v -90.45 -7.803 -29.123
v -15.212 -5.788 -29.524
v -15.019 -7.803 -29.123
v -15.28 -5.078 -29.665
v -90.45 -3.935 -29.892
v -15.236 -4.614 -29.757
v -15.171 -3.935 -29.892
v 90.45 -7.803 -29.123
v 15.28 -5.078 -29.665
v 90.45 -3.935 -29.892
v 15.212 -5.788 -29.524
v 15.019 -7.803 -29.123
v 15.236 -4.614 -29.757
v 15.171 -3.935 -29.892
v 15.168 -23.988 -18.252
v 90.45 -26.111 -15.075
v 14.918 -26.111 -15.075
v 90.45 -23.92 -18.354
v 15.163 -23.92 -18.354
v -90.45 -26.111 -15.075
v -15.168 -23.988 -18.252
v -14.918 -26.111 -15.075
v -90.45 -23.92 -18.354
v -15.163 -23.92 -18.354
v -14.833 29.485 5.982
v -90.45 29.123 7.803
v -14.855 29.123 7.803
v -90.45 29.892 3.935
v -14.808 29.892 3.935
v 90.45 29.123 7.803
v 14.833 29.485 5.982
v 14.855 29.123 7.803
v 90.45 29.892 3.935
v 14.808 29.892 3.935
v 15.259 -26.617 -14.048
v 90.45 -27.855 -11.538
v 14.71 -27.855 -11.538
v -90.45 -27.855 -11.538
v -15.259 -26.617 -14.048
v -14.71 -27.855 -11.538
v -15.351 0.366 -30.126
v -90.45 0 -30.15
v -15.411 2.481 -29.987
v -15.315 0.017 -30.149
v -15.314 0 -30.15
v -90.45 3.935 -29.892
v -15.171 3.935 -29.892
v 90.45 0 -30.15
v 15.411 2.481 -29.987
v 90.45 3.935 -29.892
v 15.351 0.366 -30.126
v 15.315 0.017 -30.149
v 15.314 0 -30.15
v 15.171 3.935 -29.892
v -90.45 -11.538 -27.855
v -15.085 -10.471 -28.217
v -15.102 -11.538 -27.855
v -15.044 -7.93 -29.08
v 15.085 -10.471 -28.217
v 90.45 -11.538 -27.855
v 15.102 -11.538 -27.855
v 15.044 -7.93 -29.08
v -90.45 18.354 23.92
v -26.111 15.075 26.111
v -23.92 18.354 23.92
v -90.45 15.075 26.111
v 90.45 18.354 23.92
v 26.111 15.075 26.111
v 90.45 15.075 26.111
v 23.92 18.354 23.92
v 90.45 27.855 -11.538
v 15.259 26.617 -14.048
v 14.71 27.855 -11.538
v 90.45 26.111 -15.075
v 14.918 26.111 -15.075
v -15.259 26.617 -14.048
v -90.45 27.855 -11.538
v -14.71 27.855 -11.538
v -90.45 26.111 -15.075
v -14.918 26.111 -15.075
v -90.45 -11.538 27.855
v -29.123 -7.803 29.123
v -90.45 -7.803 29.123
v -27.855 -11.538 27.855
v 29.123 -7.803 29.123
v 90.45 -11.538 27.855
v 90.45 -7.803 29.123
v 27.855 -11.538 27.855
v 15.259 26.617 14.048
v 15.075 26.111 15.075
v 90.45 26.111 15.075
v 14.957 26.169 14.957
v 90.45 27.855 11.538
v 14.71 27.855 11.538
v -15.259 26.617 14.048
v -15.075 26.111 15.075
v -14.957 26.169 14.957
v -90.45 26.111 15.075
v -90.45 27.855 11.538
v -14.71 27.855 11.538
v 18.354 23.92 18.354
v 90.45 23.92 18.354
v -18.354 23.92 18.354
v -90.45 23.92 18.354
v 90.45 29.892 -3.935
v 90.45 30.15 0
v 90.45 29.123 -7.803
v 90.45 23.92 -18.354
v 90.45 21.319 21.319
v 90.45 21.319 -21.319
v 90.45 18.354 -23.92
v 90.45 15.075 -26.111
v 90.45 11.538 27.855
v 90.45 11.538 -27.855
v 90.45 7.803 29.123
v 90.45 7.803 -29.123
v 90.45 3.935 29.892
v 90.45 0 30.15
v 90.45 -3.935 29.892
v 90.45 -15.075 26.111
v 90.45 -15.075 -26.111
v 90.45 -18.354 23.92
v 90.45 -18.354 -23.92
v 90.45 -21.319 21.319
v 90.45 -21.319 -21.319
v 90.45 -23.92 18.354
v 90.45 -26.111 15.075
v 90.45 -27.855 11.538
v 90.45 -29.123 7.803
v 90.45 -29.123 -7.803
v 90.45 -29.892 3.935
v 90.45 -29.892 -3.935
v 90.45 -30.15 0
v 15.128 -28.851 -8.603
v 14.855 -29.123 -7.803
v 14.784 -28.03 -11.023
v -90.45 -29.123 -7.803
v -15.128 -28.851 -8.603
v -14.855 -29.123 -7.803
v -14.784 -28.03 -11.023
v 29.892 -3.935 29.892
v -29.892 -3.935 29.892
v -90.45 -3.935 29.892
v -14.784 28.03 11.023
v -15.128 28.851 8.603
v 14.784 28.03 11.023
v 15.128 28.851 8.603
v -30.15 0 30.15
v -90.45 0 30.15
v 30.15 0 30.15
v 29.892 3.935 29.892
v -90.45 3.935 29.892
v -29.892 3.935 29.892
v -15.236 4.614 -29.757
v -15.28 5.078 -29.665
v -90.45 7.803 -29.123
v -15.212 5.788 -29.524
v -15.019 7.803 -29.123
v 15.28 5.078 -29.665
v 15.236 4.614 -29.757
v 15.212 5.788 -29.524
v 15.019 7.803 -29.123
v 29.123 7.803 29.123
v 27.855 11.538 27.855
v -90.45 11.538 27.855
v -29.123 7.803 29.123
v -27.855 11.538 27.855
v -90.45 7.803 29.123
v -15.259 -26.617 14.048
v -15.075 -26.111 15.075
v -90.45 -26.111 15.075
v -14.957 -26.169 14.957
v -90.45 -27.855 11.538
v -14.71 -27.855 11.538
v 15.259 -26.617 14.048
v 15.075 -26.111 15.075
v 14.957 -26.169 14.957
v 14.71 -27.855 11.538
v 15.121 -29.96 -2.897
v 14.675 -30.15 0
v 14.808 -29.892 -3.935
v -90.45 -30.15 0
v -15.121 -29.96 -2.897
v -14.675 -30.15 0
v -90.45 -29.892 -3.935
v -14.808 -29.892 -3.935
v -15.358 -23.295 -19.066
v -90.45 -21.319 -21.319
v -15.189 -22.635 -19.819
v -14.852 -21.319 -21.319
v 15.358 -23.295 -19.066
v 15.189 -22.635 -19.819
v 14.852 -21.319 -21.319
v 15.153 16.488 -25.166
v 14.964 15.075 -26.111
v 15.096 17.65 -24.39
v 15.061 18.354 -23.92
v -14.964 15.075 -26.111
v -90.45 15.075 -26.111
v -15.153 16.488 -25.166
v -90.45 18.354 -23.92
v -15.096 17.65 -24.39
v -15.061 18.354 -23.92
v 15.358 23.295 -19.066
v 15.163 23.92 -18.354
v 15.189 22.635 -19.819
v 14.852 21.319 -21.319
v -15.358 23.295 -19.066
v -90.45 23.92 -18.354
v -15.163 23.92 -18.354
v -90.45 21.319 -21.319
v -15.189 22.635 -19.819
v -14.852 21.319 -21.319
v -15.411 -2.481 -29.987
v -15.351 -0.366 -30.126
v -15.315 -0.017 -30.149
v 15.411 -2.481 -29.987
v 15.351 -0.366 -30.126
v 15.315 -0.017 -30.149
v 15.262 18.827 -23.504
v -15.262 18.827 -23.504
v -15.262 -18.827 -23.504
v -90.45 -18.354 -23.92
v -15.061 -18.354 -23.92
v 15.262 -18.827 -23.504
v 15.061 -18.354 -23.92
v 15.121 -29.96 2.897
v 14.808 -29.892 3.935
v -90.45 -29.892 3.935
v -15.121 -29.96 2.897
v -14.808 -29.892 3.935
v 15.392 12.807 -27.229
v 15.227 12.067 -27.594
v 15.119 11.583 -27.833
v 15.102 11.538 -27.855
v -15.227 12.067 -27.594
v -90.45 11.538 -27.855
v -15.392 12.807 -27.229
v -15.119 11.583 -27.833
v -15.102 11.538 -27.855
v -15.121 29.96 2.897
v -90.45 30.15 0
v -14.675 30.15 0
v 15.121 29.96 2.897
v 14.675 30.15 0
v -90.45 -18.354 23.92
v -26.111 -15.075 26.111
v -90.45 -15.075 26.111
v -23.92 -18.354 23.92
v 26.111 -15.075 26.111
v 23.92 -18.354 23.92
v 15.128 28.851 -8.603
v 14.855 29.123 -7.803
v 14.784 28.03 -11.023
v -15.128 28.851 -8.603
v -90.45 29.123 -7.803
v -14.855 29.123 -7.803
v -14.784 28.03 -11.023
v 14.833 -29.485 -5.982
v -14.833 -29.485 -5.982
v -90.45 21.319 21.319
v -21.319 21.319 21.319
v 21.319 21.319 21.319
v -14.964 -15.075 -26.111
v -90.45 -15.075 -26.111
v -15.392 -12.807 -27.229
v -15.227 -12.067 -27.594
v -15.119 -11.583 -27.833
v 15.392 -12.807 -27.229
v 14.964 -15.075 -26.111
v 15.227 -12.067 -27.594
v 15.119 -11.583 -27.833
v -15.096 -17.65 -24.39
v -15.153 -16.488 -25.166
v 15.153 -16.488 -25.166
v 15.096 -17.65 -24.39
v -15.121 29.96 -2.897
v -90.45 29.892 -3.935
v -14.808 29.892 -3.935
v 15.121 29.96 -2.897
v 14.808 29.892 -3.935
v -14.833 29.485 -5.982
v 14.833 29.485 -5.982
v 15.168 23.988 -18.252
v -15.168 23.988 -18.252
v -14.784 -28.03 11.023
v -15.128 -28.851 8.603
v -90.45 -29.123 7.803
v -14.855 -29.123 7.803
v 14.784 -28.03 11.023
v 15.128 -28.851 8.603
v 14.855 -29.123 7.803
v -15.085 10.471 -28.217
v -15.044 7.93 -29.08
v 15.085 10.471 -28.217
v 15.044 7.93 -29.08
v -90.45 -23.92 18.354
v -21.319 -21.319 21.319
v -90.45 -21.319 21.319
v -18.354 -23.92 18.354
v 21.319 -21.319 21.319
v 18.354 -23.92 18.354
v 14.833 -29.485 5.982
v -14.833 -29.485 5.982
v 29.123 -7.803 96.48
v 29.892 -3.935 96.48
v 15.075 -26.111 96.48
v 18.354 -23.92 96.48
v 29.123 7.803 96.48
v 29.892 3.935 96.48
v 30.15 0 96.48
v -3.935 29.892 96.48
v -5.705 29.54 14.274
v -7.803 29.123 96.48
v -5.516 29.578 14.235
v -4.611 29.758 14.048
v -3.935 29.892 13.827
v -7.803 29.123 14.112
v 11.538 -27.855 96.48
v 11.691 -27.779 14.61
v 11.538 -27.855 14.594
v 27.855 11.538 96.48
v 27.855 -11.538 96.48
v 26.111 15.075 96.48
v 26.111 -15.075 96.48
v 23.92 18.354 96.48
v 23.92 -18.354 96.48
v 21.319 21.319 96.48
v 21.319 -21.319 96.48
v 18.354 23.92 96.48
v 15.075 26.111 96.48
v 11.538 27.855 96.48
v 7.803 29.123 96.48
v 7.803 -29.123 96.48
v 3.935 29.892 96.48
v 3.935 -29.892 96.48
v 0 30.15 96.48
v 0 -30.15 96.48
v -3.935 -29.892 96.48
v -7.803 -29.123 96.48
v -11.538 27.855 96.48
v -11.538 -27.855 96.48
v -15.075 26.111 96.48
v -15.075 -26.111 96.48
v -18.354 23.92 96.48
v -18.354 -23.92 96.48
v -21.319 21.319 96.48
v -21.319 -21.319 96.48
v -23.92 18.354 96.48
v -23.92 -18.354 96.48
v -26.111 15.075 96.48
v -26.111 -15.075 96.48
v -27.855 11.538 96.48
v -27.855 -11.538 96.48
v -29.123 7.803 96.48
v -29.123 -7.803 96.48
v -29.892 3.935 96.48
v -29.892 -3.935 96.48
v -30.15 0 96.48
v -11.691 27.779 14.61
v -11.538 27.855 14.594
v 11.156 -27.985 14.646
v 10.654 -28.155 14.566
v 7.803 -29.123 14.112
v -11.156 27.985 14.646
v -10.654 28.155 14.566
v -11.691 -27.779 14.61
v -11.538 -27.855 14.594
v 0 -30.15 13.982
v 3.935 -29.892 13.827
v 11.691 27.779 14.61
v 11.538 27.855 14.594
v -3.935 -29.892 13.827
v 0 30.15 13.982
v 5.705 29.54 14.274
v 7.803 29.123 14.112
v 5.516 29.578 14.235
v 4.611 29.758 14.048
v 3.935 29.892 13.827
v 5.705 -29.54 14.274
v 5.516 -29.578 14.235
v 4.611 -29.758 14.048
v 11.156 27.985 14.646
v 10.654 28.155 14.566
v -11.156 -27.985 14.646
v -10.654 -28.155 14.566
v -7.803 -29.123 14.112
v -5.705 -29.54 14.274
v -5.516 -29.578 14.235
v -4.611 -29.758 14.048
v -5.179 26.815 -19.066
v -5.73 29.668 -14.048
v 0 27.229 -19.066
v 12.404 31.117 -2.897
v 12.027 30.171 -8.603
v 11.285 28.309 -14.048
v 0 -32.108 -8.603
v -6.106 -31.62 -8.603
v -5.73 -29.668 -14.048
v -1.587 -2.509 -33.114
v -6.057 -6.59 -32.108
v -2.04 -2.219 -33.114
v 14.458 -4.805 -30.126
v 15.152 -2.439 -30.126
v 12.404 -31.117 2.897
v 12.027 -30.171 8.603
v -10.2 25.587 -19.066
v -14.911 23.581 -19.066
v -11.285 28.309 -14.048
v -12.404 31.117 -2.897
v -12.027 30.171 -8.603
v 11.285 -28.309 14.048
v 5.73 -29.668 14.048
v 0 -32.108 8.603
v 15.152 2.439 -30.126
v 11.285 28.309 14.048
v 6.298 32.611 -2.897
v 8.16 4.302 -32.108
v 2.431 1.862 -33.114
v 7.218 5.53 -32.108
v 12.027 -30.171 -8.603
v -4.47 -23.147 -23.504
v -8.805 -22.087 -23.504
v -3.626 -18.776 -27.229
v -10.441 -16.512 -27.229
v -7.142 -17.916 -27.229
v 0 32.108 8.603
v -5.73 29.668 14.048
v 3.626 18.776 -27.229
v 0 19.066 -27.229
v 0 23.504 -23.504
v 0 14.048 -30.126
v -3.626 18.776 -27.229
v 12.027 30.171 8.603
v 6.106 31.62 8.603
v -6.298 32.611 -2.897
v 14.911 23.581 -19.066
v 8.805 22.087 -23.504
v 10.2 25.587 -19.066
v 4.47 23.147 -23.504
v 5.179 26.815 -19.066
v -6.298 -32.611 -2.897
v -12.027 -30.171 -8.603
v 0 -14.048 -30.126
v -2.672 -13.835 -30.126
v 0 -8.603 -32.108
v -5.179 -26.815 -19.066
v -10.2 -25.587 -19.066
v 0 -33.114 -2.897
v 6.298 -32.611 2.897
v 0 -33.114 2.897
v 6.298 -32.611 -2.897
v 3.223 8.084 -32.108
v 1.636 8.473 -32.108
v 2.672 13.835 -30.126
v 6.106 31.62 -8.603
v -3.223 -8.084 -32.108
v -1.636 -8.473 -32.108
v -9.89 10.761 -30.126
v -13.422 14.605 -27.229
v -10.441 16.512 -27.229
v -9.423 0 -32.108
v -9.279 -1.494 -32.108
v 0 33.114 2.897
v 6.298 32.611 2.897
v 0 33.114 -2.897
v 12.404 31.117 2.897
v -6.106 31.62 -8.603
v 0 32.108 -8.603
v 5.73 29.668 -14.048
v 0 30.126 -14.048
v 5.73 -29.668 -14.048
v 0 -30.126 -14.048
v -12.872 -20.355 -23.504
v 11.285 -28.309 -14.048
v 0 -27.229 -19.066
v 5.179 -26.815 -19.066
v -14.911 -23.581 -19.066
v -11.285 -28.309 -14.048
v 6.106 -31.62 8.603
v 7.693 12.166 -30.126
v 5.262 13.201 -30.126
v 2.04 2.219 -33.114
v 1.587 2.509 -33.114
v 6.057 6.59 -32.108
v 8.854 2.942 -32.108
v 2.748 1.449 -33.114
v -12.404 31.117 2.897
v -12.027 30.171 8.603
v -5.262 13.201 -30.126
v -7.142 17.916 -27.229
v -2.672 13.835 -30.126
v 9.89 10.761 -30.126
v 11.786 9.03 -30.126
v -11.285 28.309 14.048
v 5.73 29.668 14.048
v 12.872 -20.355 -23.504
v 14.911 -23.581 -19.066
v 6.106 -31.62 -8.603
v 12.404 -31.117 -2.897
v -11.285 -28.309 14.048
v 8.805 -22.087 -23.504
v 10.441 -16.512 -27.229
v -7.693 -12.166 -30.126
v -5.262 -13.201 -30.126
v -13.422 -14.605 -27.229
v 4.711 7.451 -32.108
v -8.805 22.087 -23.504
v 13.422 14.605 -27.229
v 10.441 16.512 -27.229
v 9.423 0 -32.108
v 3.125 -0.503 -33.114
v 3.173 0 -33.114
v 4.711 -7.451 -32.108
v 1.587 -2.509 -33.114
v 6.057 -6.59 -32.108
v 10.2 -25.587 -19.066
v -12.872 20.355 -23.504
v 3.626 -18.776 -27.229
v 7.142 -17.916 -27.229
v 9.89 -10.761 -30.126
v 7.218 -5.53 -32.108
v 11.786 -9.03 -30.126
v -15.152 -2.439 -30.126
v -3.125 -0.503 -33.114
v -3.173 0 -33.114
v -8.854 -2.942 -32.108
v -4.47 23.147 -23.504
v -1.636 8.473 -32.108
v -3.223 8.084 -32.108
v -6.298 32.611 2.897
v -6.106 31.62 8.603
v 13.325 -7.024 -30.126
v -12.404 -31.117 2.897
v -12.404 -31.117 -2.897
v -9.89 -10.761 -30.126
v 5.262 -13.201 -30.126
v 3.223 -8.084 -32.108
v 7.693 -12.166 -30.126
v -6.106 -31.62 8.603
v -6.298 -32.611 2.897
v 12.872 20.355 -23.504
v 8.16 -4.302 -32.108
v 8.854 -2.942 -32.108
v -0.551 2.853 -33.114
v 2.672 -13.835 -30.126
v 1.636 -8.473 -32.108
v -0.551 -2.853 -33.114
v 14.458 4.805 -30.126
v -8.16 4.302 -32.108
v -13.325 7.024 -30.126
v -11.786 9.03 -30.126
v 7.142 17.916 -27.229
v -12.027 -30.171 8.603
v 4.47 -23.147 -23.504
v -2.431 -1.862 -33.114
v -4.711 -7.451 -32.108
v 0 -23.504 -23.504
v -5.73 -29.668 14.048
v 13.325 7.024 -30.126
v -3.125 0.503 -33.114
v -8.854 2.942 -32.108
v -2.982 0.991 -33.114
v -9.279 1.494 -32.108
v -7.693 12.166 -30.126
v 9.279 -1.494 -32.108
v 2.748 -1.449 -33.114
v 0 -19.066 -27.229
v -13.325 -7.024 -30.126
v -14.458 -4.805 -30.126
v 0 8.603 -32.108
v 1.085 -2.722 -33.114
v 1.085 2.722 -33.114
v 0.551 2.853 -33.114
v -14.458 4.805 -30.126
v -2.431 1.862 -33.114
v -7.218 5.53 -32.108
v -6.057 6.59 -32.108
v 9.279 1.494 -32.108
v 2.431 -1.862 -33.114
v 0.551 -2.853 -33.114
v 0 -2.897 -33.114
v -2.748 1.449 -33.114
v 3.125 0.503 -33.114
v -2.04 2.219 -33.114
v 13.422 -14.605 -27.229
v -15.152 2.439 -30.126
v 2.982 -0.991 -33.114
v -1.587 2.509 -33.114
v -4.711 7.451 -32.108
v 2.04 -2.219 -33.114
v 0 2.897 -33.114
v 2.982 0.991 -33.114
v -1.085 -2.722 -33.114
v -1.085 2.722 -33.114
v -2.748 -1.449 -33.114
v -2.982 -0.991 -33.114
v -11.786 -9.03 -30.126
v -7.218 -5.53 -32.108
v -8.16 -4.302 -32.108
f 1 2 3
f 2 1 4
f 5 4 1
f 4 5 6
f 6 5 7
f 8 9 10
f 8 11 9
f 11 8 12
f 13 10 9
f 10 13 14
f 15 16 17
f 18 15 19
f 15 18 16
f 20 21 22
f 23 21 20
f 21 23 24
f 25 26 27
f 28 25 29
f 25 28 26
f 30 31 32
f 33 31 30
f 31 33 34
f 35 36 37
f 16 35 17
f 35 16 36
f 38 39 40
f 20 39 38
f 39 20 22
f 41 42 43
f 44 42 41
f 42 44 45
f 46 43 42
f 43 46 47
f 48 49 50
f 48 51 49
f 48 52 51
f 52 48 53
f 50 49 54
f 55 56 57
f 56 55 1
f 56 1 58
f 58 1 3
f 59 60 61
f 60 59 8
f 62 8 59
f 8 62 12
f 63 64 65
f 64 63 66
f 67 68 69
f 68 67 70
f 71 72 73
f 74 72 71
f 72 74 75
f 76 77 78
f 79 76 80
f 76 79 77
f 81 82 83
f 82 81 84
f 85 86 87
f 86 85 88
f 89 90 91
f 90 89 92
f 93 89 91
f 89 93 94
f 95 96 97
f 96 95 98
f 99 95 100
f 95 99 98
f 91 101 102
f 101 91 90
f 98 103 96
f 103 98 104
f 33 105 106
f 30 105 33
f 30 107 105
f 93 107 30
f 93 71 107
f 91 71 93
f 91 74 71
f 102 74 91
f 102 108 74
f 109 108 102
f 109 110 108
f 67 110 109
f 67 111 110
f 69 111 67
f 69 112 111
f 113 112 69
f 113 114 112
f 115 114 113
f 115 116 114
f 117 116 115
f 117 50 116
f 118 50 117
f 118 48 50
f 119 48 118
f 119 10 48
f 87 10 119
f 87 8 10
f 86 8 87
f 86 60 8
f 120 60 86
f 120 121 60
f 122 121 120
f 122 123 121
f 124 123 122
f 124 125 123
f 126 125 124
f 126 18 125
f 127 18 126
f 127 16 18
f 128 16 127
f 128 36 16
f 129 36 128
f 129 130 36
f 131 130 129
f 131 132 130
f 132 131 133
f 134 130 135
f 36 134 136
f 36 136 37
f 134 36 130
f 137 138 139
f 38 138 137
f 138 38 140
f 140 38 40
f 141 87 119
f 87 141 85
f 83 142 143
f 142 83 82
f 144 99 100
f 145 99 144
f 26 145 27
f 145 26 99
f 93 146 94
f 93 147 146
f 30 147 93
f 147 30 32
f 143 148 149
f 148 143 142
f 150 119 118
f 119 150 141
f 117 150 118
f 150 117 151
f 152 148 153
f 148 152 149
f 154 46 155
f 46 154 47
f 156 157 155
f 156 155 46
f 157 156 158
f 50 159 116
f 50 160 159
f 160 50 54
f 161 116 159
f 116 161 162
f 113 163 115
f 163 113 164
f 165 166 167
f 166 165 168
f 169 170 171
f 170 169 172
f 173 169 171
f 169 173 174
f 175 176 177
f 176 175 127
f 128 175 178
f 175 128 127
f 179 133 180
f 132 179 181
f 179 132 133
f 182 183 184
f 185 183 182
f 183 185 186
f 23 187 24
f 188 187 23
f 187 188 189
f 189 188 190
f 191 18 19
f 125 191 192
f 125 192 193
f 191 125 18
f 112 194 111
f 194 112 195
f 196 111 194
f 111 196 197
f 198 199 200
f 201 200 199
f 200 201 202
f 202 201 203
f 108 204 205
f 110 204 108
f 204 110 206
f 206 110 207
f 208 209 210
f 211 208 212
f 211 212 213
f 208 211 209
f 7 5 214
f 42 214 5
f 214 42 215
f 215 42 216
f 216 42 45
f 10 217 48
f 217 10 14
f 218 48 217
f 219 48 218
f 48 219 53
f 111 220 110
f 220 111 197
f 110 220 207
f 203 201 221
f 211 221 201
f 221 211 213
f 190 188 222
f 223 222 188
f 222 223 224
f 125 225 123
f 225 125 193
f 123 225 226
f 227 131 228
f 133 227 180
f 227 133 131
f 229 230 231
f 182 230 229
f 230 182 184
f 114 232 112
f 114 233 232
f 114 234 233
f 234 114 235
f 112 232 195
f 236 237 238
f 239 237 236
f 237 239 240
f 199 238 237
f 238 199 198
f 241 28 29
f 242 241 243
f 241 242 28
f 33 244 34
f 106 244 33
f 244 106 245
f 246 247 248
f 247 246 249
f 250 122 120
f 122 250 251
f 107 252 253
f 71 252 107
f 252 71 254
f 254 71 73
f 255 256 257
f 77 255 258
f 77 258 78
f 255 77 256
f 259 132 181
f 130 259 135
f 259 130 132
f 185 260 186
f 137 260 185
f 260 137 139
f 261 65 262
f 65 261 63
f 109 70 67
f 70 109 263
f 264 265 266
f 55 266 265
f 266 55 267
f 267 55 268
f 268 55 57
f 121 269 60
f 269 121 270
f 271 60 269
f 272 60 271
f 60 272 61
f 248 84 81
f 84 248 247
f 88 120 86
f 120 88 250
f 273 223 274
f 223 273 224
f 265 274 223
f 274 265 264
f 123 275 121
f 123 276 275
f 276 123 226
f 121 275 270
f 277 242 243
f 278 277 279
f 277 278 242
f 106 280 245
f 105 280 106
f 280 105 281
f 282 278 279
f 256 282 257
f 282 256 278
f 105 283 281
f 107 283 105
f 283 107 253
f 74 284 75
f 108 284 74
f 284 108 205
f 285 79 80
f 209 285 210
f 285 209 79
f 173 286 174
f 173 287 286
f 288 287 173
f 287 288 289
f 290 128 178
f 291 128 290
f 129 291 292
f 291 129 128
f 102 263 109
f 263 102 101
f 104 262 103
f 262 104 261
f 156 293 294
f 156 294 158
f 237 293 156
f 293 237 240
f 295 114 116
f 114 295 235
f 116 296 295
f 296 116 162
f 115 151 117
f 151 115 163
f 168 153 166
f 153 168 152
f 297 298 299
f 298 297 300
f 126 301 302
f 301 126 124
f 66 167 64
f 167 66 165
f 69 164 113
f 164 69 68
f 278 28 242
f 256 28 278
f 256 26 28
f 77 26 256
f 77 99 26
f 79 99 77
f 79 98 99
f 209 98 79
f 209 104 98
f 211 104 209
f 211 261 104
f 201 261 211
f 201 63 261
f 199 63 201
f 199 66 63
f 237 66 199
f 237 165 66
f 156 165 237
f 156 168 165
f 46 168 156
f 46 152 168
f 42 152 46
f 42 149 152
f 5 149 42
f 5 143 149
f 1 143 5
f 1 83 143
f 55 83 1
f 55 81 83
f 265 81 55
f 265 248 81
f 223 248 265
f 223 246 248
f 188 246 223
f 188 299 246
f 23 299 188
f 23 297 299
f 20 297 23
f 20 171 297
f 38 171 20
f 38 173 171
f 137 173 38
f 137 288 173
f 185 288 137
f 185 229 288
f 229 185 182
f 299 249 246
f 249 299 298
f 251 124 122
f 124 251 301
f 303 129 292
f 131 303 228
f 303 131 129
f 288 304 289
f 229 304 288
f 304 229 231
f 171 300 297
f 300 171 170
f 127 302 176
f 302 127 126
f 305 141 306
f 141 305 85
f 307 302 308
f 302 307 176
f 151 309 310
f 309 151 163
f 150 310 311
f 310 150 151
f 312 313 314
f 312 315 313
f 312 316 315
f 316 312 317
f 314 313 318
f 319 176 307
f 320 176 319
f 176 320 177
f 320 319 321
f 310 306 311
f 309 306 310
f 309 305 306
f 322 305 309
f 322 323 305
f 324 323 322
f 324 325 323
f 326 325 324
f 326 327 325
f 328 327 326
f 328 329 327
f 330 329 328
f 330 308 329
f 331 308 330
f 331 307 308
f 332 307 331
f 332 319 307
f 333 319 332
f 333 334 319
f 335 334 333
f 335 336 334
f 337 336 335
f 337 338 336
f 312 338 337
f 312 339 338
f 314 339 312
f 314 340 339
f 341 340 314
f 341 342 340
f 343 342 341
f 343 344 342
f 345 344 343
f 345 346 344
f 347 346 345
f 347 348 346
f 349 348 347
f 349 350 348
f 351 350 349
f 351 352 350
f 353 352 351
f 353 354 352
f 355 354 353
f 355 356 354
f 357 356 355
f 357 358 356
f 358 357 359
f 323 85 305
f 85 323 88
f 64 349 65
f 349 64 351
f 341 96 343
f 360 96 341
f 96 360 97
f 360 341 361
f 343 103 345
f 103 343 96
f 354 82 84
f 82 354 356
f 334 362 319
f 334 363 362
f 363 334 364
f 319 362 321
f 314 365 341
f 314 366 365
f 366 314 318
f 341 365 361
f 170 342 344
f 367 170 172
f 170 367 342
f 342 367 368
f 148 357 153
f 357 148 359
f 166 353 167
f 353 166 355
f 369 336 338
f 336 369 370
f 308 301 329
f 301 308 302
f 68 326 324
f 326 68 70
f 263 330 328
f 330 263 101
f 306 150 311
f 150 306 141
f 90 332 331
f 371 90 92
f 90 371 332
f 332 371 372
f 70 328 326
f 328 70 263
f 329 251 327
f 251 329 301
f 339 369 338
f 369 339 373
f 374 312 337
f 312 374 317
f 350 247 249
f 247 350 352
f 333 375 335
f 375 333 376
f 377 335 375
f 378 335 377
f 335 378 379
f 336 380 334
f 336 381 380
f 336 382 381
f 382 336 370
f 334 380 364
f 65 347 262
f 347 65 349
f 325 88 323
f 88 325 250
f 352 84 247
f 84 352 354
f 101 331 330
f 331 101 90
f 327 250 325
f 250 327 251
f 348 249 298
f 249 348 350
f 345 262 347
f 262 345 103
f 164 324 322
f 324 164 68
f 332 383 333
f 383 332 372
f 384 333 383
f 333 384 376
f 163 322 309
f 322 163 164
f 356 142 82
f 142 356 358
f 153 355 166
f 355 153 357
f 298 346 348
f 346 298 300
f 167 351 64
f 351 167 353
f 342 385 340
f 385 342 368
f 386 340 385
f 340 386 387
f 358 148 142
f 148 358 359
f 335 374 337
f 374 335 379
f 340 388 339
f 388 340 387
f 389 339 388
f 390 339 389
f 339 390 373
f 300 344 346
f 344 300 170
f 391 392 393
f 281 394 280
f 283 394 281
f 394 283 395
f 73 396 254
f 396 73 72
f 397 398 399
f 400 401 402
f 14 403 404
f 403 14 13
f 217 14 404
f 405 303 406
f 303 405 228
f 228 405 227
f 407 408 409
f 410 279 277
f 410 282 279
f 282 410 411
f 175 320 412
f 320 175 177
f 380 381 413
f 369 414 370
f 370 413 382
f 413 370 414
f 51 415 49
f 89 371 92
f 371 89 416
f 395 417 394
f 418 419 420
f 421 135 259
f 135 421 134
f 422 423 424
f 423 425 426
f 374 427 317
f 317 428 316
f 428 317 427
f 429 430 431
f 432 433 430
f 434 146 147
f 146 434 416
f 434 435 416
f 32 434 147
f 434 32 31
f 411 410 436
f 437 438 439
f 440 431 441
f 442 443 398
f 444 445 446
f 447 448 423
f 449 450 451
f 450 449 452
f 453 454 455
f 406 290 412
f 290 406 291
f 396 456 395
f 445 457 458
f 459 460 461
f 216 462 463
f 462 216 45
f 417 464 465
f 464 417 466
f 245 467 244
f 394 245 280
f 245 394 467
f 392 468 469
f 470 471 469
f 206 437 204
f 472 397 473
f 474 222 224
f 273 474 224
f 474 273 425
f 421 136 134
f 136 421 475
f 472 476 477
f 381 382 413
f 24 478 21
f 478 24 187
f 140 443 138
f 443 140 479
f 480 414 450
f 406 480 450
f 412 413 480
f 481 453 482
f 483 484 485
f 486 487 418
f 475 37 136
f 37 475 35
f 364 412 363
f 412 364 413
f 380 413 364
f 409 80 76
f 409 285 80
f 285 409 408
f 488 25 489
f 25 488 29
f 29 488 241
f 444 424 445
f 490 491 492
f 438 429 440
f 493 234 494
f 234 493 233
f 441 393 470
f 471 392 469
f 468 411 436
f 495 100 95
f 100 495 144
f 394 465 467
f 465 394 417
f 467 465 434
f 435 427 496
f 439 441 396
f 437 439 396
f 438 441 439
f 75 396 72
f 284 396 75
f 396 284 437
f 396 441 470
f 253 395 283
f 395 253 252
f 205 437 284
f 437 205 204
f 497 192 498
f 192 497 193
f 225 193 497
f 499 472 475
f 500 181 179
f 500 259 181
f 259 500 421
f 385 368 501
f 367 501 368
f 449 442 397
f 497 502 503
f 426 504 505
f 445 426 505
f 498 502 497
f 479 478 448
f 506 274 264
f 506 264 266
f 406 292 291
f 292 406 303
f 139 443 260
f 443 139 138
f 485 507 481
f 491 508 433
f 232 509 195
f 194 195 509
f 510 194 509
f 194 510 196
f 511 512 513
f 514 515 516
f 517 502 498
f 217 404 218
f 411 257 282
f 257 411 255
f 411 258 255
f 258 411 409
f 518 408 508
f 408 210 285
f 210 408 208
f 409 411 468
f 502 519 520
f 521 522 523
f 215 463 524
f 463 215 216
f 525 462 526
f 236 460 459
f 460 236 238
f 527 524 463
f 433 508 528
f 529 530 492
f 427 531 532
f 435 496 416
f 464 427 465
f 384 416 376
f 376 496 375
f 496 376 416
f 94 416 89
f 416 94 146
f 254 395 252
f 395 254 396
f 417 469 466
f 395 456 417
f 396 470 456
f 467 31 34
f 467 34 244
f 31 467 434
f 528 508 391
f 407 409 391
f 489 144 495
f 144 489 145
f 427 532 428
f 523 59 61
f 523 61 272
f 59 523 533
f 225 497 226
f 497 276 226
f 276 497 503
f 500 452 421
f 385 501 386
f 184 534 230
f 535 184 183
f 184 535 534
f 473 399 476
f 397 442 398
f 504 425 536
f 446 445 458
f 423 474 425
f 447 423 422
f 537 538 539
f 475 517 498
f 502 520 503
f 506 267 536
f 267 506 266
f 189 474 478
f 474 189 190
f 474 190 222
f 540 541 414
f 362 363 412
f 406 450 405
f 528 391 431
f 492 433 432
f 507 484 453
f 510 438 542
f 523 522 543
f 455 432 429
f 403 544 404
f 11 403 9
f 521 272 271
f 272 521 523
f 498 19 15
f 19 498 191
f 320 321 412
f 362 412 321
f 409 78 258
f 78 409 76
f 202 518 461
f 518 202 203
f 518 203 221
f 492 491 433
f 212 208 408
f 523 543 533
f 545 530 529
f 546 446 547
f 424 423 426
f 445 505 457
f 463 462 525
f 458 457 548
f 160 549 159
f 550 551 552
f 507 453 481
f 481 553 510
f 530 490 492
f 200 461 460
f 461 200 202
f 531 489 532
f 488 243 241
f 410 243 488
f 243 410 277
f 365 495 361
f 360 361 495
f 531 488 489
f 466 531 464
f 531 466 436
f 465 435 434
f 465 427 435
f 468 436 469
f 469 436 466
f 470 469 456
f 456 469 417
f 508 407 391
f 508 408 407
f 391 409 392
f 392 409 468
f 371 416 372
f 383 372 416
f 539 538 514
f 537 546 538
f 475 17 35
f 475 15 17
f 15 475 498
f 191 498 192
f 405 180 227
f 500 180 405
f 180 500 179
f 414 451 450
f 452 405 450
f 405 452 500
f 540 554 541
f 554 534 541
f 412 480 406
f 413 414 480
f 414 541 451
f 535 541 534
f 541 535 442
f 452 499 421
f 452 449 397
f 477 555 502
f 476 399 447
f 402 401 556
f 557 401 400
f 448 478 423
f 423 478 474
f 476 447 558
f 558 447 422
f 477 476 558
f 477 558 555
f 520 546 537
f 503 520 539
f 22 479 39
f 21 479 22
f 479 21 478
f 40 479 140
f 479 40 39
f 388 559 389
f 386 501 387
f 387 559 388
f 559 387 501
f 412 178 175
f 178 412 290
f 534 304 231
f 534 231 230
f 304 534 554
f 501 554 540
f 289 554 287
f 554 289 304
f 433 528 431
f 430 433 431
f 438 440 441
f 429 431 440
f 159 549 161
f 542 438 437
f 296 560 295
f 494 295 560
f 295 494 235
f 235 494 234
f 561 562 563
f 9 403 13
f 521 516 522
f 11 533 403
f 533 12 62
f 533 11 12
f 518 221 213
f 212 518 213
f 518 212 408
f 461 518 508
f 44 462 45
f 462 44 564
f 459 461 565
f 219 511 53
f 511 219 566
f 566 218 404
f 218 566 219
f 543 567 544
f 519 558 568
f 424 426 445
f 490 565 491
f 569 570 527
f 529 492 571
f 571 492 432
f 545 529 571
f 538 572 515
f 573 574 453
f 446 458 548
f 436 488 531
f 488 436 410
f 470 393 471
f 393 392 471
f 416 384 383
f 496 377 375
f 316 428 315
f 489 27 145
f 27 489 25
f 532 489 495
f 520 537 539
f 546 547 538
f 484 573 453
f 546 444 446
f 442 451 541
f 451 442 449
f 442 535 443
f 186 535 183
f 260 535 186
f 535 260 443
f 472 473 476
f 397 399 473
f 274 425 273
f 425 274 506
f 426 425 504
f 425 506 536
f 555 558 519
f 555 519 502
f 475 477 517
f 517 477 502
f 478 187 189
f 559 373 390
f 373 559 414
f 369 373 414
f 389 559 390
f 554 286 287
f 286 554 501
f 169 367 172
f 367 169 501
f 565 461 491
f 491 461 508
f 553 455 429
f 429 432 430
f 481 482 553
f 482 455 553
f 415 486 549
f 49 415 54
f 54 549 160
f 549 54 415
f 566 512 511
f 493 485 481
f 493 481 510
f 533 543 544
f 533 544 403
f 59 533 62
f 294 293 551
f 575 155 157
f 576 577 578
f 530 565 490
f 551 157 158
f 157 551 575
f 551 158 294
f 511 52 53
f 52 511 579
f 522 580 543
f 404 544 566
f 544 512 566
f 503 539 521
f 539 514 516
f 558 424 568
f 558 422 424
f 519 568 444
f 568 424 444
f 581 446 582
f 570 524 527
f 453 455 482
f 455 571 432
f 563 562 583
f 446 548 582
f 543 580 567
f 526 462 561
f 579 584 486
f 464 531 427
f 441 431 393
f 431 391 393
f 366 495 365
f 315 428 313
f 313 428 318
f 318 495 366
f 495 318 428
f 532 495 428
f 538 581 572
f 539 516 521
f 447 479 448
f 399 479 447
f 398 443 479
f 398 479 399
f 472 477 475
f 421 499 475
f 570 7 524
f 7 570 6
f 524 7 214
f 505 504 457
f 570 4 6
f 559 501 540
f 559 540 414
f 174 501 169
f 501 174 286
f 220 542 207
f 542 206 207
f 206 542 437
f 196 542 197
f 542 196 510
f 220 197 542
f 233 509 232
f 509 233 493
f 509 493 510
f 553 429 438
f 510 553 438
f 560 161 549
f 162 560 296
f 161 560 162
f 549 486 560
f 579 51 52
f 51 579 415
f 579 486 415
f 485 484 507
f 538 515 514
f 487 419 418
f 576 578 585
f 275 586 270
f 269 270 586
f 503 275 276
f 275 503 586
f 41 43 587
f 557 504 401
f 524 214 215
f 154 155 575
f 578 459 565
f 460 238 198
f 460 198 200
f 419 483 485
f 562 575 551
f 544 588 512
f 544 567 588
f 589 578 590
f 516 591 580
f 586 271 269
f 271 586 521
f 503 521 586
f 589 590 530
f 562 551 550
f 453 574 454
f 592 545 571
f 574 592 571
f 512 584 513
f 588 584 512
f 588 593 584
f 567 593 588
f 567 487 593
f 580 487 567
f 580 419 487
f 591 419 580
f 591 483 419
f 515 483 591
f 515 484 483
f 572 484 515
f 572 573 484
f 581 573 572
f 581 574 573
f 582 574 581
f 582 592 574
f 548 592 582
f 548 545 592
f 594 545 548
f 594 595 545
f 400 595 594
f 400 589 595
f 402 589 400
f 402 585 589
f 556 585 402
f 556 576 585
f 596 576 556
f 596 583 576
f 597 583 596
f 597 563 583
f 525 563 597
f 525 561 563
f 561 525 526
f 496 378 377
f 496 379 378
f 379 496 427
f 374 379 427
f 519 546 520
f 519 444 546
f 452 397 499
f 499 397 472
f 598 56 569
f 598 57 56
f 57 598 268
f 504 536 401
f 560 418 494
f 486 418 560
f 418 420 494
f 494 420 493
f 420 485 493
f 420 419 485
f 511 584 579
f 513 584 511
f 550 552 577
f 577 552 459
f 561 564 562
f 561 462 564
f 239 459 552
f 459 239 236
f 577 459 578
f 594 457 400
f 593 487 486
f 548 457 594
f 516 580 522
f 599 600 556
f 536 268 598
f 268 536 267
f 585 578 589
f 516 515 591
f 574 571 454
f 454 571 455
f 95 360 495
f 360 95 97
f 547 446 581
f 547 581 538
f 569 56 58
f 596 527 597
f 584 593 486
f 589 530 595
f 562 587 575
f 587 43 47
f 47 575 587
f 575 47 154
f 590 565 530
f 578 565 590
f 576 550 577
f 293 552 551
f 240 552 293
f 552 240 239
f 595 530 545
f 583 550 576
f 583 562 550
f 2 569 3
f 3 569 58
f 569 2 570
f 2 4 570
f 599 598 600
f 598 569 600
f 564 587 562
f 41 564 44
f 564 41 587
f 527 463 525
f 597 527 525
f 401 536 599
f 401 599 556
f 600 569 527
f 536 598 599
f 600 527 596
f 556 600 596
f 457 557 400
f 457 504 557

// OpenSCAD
// Equal-run grooved tee. Run along X, branch along +Z.
//
//   run_in:  (-L/2, 0, 0), dir (-1, 0, 0)
//   run_out: (+L/2, 0, 0), dir (+1, 0, 0)
//   branch:  (0, 0, L/2),  dir (0, 0, +1)

size_in = 2;

function od_mm(nps) =
    nps ==   1  ? 33.4 :
    nps == 1.25 ? 42.2 :
    nps == 1.5  ? 48.3 :
    nps ==   2  ? 60.3 :
    nps == 2.5  ? 73.0 :
    nps ==   3  ? 88.9 :
    nps ==   4  ? 114.3 :
    nps ==   5  ? 141.3 :
    nps ==   6  ? 168.3 :
    nps ==   8  ? 219.1 :
    nps ==  10  ? 273.0 : 60.3;

od = od_mm(size_in);
run_mm    = od * 3.0;
branch_mm = od * 1.6;

union() {
    // Run (X axis)
    rotate([0, 90, 0])
        cylinder(h = run_mm, d = od, center = true, $fn = 48);
    // Branch (Z axis)
    translate([0, 0, branch_mm / 2])
        cylinder(h = branch_mm, d = od, center = true, $fn = 48);
    // Reinforcement hub
    scale([1.15, 1.05, 1.05])
        sphere(d = od * 1.05, $fn = 36);
}
